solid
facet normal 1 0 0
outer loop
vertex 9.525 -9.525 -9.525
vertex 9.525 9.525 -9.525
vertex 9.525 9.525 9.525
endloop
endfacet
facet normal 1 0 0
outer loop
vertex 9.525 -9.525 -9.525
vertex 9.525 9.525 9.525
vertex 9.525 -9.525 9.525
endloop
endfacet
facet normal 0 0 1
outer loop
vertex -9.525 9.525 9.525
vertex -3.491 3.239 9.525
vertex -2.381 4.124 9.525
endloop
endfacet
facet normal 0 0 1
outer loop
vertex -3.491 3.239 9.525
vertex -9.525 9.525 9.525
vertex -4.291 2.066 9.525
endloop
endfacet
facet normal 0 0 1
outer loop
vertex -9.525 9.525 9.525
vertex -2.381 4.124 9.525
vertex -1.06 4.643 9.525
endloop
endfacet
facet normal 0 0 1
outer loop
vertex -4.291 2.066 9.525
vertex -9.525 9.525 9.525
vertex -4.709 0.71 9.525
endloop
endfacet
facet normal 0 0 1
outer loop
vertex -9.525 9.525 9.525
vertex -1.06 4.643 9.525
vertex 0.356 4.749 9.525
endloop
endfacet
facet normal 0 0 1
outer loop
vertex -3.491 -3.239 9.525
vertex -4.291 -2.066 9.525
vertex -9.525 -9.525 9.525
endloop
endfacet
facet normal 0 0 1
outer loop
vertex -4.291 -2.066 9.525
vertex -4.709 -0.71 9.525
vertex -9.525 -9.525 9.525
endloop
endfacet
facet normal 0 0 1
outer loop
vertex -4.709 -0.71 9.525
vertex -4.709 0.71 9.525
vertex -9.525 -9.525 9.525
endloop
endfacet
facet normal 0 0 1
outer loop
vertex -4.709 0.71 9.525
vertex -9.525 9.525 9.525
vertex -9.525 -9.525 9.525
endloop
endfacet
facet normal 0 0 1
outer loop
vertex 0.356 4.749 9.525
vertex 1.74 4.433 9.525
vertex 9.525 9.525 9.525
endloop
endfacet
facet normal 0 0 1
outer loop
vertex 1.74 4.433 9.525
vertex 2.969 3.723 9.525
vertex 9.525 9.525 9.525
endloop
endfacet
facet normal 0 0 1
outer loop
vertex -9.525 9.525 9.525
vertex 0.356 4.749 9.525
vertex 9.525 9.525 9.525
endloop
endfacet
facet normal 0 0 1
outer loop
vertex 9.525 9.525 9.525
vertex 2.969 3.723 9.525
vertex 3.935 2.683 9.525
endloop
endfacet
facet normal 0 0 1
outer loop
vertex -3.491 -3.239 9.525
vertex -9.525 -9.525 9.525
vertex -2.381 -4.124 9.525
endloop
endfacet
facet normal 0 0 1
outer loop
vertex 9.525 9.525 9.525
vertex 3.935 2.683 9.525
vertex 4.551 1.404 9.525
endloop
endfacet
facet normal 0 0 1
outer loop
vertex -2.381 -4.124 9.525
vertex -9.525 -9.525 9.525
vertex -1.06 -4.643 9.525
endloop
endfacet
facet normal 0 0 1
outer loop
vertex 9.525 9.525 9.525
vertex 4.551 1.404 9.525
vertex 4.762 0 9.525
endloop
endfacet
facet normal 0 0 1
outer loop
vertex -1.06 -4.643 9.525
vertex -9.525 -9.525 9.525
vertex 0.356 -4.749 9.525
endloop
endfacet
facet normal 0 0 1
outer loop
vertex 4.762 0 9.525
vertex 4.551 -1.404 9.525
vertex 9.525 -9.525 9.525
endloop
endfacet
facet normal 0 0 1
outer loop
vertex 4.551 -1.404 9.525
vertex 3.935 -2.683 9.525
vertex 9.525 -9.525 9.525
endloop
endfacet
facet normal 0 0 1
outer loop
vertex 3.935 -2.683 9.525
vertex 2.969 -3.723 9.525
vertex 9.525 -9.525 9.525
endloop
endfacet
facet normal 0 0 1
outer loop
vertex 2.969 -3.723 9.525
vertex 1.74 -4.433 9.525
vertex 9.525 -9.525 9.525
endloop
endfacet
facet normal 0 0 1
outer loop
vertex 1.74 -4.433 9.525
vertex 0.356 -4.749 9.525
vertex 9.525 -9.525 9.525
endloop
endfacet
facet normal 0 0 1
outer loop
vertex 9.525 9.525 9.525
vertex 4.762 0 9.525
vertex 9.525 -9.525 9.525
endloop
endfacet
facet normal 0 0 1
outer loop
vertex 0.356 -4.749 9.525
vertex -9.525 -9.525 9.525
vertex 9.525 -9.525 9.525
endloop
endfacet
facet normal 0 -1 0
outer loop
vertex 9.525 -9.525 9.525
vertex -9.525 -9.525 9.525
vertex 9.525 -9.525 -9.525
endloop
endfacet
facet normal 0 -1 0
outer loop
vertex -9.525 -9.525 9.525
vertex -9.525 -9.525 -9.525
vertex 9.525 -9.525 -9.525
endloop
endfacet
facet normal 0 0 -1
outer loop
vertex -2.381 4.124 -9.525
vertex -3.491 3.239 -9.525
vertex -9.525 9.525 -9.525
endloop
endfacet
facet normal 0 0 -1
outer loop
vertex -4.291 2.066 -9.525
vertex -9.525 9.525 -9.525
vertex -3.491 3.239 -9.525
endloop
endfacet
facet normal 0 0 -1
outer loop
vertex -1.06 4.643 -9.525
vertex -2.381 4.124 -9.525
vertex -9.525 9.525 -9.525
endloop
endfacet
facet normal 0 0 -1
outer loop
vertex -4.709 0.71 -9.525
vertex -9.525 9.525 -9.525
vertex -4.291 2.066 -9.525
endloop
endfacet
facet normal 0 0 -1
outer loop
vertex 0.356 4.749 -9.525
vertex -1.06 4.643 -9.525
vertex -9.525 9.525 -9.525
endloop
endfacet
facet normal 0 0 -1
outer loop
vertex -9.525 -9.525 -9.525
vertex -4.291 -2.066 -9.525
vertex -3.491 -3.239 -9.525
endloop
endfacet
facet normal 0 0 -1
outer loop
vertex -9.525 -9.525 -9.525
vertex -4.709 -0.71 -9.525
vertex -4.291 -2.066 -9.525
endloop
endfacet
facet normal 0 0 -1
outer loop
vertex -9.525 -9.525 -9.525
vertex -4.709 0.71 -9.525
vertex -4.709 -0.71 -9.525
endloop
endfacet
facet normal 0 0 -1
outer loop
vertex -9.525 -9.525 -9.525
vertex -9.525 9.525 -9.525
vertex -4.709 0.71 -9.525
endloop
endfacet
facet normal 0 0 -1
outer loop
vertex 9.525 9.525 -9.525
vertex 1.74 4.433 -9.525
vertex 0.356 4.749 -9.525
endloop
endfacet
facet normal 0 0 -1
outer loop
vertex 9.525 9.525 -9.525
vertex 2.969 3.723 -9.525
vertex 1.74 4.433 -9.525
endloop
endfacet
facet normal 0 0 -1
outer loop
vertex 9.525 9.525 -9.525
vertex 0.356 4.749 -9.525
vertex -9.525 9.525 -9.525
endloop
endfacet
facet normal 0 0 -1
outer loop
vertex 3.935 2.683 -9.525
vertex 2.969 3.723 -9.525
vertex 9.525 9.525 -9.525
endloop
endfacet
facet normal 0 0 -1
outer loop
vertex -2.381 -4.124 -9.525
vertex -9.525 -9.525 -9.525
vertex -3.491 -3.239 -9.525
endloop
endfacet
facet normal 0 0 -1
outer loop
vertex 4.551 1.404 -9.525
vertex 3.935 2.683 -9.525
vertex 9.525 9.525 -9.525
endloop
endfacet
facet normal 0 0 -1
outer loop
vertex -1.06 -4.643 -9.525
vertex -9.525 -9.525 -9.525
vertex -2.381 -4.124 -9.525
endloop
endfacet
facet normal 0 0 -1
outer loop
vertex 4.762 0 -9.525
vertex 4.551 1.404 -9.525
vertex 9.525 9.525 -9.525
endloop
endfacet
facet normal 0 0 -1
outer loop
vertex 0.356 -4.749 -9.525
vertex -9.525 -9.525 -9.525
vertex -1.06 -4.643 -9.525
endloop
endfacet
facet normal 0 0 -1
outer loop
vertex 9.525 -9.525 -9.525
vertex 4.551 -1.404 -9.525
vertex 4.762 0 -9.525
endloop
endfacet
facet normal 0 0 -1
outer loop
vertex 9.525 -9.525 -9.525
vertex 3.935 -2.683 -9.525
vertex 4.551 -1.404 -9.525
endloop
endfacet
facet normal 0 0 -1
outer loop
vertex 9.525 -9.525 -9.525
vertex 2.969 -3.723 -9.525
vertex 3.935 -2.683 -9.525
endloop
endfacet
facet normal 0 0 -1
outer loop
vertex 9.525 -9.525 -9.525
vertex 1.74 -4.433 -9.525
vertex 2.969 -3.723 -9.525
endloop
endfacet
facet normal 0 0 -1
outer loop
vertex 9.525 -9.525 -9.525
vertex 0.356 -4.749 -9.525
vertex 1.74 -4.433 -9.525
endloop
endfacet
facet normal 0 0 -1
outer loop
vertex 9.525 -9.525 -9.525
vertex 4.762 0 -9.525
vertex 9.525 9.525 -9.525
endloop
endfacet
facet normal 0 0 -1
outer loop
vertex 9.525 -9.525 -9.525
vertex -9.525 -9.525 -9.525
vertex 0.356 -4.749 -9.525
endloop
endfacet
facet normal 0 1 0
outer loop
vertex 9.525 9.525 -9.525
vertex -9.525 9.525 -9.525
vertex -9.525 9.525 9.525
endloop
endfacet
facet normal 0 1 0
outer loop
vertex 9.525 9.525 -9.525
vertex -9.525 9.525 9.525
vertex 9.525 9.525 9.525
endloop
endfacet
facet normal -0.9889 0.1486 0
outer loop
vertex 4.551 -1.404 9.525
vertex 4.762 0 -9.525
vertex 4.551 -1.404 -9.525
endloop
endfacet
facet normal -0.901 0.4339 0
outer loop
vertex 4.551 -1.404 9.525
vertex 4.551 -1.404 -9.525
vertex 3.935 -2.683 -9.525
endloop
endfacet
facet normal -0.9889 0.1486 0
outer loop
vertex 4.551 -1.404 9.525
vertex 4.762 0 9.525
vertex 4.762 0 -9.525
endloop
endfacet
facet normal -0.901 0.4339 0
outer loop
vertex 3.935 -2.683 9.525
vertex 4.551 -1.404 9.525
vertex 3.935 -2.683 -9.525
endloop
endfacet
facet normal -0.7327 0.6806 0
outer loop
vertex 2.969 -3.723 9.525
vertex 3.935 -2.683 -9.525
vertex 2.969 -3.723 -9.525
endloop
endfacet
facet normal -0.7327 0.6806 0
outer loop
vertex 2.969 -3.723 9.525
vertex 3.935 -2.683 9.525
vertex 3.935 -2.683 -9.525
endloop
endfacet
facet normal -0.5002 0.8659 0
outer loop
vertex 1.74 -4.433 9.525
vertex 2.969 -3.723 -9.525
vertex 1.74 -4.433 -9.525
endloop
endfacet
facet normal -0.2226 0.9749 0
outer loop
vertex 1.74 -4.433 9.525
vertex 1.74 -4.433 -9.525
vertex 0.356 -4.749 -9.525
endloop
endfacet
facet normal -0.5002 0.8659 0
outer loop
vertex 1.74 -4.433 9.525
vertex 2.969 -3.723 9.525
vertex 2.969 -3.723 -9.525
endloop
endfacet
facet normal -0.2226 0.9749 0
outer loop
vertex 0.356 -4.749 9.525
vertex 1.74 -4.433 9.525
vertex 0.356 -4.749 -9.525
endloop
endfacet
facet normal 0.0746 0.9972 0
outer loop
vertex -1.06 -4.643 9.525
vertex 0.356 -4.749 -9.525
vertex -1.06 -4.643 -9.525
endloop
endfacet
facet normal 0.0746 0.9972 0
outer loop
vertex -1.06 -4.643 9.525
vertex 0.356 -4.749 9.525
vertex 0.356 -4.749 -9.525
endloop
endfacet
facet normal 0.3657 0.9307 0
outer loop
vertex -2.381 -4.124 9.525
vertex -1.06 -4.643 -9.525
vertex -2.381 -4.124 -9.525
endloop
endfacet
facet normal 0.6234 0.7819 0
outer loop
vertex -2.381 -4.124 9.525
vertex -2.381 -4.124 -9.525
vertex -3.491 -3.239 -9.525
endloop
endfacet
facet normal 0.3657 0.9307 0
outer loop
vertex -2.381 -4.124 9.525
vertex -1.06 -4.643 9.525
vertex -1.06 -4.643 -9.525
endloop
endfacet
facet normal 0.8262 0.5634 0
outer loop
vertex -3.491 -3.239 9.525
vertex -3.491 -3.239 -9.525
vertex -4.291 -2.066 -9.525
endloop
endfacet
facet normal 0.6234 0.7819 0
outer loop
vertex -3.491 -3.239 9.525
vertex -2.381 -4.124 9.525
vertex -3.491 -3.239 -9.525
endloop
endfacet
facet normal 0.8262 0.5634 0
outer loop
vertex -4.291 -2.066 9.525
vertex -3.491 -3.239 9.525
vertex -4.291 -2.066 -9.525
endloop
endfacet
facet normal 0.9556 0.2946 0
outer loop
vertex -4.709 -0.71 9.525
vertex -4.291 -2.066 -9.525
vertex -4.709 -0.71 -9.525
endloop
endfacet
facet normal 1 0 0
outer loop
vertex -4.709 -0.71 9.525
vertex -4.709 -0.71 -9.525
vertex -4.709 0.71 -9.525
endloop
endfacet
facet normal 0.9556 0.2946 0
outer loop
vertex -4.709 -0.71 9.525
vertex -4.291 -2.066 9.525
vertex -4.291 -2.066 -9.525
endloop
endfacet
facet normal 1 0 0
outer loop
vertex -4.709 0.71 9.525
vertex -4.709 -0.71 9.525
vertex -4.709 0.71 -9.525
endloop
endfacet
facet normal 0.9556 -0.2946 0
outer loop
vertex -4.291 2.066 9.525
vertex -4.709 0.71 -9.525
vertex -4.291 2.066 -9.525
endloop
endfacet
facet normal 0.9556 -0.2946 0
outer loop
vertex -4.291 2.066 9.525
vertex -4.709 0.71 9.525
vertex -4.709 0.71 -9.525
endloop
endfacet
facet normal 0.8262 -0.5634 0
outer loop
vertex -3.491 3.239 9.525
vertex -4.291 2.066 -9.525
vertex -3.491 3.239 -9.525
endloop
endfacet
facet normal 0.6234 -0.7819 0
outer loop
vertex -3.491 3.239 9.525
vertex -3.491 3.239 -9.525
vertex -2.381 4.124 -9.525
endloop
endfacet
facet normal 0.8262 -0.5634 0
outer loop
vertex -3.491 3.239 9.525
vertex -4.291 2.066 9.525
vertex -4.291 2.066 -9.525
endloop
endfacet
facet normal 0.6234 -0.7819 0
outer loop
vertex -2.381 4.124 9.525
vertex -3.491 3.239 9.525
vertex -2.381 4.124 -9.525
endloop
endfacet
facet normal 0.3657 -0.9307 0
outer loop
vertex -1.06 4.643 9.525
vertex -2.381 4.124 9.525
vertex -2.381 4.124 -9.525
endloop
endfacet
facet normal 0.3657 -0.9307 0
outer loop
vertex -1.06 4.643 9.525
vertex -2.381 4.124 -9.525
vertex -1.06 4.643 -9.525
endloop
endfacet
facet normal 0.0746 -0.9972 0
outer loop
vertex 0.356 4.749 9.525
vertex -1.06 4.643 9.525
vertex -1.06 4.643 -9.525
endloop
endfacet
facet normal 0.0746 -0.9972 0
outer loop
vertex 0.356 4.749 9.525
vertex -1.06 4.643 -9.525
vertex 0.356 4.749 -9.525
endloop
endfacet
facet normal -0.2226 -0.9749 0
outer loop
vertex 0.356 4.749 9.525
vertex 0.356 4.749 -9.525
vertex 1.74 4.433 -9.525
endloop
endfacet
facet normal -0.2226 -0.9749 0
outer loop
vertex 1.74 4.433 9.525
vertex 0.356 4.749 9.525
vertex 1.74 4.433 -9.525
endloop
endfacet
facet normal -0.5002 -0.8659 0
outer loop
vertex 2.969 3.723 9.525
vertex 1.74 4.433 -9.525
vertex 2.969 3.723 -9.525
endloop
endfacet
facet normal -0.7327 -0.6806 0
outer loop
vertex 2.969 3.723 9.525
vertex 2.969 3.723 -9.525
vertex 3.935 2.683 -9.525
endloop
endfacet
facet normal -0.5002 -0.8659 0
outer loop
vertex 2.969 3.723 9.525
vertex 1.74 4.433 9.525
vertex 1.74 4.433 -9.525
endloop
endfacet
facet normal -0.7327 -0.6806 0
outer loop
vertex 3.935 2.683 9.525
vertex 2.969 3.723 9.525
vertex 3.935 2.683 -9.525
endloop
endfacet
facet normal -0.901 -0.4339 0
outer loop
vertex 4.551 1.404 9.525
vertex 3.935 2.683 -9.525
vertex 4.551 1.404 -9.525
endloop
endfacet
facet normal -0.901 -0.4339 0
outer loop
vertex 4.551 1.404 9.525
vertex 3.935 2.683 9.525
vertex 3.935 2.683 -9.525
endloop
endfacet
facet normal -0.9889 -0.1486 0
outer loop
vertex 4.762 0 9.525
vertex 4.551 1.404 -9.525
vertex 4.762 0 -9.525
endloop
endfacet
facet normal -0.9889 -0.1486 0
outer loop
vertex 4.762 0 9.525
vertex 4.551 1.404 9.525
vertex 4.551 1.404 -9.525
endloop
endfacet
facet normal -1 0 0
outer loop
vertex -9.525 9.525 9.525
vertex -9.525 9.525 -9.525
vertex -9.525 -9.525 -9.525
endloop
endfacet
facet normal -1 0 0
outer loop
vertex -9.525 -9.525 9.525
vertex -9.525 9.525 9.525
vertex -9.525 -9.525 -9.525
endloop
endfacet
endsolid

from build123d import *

# Parameters (mm, degrees)
F0_W     = 19.05
F0_H     = 19.05
F0_R     = 4.7625
F1_DEPTH = 9.525
F2_ANGLE = 90


with BuildPart() as f1:
    # F0 (on Front) → F1 (new body, symmetric)
    with BuildSketch(Plane.XZ):
        Rectangle(F0_W, F0_H)
        Circle(F0_R, mode=Mode.SUBTRACT)
    extrude(amount=F1_DEPTH, both=True)


with BuildPart() as f1_1:
    # F2: moved
    add(f1.part.rotate(Axis((4.7625, 0, 0), (1, 0, 0)), F2_ANGLE))


solid = f1_1.part
